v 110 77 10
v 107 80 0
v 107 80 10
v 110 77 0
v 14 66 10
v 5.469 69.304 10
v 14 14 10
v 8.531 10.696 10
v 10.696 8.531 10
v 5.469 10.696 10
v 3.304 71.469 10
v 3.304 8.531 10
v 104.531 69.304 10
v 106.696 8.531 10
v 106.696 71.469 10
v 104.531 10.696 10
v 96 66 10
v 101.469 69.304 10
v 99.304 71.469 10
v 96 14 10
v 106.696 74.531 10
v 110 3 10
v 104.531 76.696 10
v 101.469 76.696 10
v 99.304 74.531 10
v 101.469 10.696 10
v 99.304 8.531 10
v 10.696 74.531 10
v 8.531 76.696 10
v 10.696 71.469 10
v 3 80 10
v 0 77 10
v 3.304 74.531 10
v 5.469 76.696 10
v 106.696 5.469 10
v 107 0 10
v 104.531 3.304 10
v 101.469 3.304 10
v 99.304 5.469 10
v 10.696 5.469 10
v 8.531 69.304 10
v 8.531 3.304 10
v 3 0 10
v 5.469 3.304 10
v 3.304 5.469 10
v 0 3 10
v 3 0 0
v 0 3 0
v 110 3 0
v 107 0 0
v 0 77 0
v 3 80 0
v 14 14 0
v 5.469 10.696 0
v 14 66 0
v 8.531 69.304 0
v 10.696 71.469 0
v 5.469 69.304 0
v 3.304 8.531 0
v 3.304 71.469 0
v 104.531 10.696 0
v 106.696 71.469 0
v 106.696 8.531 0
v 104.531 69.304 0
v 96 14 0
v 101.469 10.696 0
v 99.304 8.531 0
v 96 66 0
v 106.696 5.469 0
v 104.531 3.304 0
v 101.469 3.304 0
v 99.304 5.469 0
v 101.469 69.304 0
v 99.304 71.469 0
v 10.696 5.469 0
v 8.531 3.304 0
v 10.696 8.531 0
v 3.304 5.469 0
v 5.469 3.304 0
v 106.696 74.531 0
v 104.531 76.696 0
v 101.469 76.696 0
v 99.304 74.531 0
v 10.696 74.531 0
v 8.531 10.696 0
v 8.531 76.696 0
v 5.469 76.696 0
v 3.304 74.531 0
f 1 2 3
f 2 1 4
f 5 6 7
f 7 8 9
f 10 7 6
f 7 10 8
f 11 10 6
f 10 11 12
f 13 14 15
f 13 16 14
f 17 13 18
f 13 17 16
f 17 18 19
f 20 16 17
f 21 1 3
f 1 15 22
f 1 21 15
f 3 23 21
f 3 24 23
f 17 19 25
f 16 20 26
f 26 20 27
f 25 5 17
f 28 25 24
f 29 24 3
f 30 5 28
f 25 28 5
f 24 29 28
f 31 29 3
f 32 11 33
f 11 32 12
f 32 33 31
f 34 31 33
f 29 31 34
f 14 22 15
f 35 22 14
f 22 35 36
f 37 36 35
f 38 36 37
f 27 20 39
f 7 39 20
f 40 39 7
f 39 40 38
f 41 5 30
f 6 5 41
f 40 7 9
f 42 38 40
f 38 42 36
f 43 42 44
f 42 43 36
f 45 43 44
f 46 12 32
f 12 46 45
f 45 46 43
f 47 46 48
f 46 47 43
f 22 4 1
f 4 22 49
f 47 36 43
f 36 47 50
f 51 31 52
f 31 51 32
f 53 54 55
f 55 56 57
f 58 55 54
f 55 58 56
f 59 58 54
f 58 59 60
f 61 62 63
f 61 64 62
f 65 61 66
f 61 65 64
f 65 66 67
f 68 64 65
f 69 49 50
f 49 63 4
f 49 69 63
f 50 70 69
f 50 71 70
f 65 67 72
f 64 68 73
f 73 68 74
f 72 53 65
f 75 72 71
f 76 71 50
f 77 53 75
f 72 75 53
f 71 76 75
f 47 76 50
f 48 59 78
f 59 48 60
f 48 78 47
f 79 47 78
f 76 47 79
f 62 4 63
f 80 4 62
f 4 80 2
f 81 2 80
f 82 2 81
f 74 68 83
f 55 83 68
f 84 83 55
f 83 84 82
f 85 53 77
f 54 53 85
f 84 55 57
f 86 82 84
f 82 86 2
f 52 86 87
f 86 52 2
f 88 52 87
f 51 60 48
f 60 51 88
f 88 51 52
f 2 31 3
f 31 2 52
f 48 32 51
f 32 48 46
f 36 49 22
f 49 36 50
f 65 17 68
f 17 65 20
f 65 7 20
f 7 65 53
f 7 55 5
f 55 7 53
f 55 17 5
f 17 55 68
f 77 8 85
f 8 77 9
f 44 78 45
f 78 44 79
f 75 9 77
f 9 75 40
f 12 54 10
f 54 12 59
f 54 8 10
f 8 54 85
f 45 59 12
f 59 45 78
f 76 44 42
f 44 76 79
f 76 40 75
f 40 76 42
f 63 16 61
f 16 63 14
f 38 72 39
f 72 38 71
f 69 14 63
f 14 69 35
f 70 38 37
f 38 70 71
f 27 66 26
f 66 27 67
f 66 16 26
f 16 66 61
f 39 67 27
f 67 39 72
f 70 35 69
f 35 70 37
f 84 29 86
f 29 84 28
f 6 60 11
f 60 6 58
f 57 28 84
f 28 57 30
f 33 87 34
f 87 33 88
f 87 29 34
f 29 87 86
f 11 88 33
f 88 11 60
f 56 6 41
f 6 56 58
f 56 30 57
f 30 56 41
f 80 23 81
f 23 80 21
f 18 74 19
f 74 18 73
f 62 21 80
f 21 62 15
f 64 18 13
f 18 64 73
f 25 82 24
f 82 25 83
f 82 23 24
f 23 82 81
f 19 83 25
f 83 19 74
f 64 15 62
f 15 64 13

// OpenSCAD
$fn = 32;

// ----------------------------------------------------------------------
// Frame plate: 110 x 80 frame, 14 mm rails
// ----------------------------------------------------------------------

// --- parameters (mm) ---
plate_l = 110;            // plate length, X
plate_w = 80;             // plate width, Y
plate_t = 10;             // plate thickness, Z (extrusion height)
corner_c = 3;             // corner chamfer
frame_bar = 14;           // frame rail width
bolt_r = 4;               // corner bolt window radius
bolt_inset = 7;           // bolt centre inset from the edges

win_l = plate_l - 2 * frame_bar;  // window length
win_w = plate_w - 2 * frame_bar;  // window width
bolt_d = 2 * bolt_r;  // corner hole diameter

profile = [[3, 0], [107, 0], [110, 3], [110, 77], [107, 80], [3, 80], [0, 77], [0, 3]];  // primary outline, 8 points, counter clockwise
void_1 = [[14, 14], [96, 14], [96, 66], [14, 66]];  // the window, 4 points
void_2 = [[10.696, 8.531], [8.531, 10.696], [5.469, 10.696], [3.304, 8.531], [3.304, 5.469], [5.469, 3.304], [8.531, 3.304], [10.696, 5.469]];  // corner bolt window, 8 points
void_3 = [[106.696, 8.531], [104.531, 10.696], [101.469, 10.696], [99.304, 8.531], [99.304, 5.469], [101.469, 3.304], [104.531, 3.304], [106.696, 5.469]];  // corner bolt window, 8 points
void_4 = [[10.696, 74.531], [8.531, 76.696], [5.469, 76.696], [3.304, 74.531], [3.304, 71.469], [5.469, 69.304], [8.531, 69.304], [10.696, 71.469]];  // corner bolt window, 8 points
void_5 = [[106.696, 74.531], [104.531, 76.696], [101.469, 76.696], [99.304, 74.531], [99.304, 71.469], [101.469, 69.304], [104.531, 69.304], [106.696, 71.469]];  // corner bolt window, 8 points

// --- the one profile operation ---
difference() {
  linear_extrude(height = plate_t) polygon(points = profile);
  translate([0, 0, -1])
    linear_extrude(height = plate_t + 2) polygon(points = void_1);
  translate([0, 0, -1])
    linear_extrude(height = plate_t + 2) polygon(points = void_2);
  translate([0, 0, -1])
    linear_extrude(height = plate_t + 2) polygon(points = void_3);
  translate([0, 0, -1])
    linear_extrude(height = plate_t + 2) polygon(points = void_4);
  translate([0, 0, -1])
    linear_extrude(height = plate_t + 2) polygon(points = void_5);
}
